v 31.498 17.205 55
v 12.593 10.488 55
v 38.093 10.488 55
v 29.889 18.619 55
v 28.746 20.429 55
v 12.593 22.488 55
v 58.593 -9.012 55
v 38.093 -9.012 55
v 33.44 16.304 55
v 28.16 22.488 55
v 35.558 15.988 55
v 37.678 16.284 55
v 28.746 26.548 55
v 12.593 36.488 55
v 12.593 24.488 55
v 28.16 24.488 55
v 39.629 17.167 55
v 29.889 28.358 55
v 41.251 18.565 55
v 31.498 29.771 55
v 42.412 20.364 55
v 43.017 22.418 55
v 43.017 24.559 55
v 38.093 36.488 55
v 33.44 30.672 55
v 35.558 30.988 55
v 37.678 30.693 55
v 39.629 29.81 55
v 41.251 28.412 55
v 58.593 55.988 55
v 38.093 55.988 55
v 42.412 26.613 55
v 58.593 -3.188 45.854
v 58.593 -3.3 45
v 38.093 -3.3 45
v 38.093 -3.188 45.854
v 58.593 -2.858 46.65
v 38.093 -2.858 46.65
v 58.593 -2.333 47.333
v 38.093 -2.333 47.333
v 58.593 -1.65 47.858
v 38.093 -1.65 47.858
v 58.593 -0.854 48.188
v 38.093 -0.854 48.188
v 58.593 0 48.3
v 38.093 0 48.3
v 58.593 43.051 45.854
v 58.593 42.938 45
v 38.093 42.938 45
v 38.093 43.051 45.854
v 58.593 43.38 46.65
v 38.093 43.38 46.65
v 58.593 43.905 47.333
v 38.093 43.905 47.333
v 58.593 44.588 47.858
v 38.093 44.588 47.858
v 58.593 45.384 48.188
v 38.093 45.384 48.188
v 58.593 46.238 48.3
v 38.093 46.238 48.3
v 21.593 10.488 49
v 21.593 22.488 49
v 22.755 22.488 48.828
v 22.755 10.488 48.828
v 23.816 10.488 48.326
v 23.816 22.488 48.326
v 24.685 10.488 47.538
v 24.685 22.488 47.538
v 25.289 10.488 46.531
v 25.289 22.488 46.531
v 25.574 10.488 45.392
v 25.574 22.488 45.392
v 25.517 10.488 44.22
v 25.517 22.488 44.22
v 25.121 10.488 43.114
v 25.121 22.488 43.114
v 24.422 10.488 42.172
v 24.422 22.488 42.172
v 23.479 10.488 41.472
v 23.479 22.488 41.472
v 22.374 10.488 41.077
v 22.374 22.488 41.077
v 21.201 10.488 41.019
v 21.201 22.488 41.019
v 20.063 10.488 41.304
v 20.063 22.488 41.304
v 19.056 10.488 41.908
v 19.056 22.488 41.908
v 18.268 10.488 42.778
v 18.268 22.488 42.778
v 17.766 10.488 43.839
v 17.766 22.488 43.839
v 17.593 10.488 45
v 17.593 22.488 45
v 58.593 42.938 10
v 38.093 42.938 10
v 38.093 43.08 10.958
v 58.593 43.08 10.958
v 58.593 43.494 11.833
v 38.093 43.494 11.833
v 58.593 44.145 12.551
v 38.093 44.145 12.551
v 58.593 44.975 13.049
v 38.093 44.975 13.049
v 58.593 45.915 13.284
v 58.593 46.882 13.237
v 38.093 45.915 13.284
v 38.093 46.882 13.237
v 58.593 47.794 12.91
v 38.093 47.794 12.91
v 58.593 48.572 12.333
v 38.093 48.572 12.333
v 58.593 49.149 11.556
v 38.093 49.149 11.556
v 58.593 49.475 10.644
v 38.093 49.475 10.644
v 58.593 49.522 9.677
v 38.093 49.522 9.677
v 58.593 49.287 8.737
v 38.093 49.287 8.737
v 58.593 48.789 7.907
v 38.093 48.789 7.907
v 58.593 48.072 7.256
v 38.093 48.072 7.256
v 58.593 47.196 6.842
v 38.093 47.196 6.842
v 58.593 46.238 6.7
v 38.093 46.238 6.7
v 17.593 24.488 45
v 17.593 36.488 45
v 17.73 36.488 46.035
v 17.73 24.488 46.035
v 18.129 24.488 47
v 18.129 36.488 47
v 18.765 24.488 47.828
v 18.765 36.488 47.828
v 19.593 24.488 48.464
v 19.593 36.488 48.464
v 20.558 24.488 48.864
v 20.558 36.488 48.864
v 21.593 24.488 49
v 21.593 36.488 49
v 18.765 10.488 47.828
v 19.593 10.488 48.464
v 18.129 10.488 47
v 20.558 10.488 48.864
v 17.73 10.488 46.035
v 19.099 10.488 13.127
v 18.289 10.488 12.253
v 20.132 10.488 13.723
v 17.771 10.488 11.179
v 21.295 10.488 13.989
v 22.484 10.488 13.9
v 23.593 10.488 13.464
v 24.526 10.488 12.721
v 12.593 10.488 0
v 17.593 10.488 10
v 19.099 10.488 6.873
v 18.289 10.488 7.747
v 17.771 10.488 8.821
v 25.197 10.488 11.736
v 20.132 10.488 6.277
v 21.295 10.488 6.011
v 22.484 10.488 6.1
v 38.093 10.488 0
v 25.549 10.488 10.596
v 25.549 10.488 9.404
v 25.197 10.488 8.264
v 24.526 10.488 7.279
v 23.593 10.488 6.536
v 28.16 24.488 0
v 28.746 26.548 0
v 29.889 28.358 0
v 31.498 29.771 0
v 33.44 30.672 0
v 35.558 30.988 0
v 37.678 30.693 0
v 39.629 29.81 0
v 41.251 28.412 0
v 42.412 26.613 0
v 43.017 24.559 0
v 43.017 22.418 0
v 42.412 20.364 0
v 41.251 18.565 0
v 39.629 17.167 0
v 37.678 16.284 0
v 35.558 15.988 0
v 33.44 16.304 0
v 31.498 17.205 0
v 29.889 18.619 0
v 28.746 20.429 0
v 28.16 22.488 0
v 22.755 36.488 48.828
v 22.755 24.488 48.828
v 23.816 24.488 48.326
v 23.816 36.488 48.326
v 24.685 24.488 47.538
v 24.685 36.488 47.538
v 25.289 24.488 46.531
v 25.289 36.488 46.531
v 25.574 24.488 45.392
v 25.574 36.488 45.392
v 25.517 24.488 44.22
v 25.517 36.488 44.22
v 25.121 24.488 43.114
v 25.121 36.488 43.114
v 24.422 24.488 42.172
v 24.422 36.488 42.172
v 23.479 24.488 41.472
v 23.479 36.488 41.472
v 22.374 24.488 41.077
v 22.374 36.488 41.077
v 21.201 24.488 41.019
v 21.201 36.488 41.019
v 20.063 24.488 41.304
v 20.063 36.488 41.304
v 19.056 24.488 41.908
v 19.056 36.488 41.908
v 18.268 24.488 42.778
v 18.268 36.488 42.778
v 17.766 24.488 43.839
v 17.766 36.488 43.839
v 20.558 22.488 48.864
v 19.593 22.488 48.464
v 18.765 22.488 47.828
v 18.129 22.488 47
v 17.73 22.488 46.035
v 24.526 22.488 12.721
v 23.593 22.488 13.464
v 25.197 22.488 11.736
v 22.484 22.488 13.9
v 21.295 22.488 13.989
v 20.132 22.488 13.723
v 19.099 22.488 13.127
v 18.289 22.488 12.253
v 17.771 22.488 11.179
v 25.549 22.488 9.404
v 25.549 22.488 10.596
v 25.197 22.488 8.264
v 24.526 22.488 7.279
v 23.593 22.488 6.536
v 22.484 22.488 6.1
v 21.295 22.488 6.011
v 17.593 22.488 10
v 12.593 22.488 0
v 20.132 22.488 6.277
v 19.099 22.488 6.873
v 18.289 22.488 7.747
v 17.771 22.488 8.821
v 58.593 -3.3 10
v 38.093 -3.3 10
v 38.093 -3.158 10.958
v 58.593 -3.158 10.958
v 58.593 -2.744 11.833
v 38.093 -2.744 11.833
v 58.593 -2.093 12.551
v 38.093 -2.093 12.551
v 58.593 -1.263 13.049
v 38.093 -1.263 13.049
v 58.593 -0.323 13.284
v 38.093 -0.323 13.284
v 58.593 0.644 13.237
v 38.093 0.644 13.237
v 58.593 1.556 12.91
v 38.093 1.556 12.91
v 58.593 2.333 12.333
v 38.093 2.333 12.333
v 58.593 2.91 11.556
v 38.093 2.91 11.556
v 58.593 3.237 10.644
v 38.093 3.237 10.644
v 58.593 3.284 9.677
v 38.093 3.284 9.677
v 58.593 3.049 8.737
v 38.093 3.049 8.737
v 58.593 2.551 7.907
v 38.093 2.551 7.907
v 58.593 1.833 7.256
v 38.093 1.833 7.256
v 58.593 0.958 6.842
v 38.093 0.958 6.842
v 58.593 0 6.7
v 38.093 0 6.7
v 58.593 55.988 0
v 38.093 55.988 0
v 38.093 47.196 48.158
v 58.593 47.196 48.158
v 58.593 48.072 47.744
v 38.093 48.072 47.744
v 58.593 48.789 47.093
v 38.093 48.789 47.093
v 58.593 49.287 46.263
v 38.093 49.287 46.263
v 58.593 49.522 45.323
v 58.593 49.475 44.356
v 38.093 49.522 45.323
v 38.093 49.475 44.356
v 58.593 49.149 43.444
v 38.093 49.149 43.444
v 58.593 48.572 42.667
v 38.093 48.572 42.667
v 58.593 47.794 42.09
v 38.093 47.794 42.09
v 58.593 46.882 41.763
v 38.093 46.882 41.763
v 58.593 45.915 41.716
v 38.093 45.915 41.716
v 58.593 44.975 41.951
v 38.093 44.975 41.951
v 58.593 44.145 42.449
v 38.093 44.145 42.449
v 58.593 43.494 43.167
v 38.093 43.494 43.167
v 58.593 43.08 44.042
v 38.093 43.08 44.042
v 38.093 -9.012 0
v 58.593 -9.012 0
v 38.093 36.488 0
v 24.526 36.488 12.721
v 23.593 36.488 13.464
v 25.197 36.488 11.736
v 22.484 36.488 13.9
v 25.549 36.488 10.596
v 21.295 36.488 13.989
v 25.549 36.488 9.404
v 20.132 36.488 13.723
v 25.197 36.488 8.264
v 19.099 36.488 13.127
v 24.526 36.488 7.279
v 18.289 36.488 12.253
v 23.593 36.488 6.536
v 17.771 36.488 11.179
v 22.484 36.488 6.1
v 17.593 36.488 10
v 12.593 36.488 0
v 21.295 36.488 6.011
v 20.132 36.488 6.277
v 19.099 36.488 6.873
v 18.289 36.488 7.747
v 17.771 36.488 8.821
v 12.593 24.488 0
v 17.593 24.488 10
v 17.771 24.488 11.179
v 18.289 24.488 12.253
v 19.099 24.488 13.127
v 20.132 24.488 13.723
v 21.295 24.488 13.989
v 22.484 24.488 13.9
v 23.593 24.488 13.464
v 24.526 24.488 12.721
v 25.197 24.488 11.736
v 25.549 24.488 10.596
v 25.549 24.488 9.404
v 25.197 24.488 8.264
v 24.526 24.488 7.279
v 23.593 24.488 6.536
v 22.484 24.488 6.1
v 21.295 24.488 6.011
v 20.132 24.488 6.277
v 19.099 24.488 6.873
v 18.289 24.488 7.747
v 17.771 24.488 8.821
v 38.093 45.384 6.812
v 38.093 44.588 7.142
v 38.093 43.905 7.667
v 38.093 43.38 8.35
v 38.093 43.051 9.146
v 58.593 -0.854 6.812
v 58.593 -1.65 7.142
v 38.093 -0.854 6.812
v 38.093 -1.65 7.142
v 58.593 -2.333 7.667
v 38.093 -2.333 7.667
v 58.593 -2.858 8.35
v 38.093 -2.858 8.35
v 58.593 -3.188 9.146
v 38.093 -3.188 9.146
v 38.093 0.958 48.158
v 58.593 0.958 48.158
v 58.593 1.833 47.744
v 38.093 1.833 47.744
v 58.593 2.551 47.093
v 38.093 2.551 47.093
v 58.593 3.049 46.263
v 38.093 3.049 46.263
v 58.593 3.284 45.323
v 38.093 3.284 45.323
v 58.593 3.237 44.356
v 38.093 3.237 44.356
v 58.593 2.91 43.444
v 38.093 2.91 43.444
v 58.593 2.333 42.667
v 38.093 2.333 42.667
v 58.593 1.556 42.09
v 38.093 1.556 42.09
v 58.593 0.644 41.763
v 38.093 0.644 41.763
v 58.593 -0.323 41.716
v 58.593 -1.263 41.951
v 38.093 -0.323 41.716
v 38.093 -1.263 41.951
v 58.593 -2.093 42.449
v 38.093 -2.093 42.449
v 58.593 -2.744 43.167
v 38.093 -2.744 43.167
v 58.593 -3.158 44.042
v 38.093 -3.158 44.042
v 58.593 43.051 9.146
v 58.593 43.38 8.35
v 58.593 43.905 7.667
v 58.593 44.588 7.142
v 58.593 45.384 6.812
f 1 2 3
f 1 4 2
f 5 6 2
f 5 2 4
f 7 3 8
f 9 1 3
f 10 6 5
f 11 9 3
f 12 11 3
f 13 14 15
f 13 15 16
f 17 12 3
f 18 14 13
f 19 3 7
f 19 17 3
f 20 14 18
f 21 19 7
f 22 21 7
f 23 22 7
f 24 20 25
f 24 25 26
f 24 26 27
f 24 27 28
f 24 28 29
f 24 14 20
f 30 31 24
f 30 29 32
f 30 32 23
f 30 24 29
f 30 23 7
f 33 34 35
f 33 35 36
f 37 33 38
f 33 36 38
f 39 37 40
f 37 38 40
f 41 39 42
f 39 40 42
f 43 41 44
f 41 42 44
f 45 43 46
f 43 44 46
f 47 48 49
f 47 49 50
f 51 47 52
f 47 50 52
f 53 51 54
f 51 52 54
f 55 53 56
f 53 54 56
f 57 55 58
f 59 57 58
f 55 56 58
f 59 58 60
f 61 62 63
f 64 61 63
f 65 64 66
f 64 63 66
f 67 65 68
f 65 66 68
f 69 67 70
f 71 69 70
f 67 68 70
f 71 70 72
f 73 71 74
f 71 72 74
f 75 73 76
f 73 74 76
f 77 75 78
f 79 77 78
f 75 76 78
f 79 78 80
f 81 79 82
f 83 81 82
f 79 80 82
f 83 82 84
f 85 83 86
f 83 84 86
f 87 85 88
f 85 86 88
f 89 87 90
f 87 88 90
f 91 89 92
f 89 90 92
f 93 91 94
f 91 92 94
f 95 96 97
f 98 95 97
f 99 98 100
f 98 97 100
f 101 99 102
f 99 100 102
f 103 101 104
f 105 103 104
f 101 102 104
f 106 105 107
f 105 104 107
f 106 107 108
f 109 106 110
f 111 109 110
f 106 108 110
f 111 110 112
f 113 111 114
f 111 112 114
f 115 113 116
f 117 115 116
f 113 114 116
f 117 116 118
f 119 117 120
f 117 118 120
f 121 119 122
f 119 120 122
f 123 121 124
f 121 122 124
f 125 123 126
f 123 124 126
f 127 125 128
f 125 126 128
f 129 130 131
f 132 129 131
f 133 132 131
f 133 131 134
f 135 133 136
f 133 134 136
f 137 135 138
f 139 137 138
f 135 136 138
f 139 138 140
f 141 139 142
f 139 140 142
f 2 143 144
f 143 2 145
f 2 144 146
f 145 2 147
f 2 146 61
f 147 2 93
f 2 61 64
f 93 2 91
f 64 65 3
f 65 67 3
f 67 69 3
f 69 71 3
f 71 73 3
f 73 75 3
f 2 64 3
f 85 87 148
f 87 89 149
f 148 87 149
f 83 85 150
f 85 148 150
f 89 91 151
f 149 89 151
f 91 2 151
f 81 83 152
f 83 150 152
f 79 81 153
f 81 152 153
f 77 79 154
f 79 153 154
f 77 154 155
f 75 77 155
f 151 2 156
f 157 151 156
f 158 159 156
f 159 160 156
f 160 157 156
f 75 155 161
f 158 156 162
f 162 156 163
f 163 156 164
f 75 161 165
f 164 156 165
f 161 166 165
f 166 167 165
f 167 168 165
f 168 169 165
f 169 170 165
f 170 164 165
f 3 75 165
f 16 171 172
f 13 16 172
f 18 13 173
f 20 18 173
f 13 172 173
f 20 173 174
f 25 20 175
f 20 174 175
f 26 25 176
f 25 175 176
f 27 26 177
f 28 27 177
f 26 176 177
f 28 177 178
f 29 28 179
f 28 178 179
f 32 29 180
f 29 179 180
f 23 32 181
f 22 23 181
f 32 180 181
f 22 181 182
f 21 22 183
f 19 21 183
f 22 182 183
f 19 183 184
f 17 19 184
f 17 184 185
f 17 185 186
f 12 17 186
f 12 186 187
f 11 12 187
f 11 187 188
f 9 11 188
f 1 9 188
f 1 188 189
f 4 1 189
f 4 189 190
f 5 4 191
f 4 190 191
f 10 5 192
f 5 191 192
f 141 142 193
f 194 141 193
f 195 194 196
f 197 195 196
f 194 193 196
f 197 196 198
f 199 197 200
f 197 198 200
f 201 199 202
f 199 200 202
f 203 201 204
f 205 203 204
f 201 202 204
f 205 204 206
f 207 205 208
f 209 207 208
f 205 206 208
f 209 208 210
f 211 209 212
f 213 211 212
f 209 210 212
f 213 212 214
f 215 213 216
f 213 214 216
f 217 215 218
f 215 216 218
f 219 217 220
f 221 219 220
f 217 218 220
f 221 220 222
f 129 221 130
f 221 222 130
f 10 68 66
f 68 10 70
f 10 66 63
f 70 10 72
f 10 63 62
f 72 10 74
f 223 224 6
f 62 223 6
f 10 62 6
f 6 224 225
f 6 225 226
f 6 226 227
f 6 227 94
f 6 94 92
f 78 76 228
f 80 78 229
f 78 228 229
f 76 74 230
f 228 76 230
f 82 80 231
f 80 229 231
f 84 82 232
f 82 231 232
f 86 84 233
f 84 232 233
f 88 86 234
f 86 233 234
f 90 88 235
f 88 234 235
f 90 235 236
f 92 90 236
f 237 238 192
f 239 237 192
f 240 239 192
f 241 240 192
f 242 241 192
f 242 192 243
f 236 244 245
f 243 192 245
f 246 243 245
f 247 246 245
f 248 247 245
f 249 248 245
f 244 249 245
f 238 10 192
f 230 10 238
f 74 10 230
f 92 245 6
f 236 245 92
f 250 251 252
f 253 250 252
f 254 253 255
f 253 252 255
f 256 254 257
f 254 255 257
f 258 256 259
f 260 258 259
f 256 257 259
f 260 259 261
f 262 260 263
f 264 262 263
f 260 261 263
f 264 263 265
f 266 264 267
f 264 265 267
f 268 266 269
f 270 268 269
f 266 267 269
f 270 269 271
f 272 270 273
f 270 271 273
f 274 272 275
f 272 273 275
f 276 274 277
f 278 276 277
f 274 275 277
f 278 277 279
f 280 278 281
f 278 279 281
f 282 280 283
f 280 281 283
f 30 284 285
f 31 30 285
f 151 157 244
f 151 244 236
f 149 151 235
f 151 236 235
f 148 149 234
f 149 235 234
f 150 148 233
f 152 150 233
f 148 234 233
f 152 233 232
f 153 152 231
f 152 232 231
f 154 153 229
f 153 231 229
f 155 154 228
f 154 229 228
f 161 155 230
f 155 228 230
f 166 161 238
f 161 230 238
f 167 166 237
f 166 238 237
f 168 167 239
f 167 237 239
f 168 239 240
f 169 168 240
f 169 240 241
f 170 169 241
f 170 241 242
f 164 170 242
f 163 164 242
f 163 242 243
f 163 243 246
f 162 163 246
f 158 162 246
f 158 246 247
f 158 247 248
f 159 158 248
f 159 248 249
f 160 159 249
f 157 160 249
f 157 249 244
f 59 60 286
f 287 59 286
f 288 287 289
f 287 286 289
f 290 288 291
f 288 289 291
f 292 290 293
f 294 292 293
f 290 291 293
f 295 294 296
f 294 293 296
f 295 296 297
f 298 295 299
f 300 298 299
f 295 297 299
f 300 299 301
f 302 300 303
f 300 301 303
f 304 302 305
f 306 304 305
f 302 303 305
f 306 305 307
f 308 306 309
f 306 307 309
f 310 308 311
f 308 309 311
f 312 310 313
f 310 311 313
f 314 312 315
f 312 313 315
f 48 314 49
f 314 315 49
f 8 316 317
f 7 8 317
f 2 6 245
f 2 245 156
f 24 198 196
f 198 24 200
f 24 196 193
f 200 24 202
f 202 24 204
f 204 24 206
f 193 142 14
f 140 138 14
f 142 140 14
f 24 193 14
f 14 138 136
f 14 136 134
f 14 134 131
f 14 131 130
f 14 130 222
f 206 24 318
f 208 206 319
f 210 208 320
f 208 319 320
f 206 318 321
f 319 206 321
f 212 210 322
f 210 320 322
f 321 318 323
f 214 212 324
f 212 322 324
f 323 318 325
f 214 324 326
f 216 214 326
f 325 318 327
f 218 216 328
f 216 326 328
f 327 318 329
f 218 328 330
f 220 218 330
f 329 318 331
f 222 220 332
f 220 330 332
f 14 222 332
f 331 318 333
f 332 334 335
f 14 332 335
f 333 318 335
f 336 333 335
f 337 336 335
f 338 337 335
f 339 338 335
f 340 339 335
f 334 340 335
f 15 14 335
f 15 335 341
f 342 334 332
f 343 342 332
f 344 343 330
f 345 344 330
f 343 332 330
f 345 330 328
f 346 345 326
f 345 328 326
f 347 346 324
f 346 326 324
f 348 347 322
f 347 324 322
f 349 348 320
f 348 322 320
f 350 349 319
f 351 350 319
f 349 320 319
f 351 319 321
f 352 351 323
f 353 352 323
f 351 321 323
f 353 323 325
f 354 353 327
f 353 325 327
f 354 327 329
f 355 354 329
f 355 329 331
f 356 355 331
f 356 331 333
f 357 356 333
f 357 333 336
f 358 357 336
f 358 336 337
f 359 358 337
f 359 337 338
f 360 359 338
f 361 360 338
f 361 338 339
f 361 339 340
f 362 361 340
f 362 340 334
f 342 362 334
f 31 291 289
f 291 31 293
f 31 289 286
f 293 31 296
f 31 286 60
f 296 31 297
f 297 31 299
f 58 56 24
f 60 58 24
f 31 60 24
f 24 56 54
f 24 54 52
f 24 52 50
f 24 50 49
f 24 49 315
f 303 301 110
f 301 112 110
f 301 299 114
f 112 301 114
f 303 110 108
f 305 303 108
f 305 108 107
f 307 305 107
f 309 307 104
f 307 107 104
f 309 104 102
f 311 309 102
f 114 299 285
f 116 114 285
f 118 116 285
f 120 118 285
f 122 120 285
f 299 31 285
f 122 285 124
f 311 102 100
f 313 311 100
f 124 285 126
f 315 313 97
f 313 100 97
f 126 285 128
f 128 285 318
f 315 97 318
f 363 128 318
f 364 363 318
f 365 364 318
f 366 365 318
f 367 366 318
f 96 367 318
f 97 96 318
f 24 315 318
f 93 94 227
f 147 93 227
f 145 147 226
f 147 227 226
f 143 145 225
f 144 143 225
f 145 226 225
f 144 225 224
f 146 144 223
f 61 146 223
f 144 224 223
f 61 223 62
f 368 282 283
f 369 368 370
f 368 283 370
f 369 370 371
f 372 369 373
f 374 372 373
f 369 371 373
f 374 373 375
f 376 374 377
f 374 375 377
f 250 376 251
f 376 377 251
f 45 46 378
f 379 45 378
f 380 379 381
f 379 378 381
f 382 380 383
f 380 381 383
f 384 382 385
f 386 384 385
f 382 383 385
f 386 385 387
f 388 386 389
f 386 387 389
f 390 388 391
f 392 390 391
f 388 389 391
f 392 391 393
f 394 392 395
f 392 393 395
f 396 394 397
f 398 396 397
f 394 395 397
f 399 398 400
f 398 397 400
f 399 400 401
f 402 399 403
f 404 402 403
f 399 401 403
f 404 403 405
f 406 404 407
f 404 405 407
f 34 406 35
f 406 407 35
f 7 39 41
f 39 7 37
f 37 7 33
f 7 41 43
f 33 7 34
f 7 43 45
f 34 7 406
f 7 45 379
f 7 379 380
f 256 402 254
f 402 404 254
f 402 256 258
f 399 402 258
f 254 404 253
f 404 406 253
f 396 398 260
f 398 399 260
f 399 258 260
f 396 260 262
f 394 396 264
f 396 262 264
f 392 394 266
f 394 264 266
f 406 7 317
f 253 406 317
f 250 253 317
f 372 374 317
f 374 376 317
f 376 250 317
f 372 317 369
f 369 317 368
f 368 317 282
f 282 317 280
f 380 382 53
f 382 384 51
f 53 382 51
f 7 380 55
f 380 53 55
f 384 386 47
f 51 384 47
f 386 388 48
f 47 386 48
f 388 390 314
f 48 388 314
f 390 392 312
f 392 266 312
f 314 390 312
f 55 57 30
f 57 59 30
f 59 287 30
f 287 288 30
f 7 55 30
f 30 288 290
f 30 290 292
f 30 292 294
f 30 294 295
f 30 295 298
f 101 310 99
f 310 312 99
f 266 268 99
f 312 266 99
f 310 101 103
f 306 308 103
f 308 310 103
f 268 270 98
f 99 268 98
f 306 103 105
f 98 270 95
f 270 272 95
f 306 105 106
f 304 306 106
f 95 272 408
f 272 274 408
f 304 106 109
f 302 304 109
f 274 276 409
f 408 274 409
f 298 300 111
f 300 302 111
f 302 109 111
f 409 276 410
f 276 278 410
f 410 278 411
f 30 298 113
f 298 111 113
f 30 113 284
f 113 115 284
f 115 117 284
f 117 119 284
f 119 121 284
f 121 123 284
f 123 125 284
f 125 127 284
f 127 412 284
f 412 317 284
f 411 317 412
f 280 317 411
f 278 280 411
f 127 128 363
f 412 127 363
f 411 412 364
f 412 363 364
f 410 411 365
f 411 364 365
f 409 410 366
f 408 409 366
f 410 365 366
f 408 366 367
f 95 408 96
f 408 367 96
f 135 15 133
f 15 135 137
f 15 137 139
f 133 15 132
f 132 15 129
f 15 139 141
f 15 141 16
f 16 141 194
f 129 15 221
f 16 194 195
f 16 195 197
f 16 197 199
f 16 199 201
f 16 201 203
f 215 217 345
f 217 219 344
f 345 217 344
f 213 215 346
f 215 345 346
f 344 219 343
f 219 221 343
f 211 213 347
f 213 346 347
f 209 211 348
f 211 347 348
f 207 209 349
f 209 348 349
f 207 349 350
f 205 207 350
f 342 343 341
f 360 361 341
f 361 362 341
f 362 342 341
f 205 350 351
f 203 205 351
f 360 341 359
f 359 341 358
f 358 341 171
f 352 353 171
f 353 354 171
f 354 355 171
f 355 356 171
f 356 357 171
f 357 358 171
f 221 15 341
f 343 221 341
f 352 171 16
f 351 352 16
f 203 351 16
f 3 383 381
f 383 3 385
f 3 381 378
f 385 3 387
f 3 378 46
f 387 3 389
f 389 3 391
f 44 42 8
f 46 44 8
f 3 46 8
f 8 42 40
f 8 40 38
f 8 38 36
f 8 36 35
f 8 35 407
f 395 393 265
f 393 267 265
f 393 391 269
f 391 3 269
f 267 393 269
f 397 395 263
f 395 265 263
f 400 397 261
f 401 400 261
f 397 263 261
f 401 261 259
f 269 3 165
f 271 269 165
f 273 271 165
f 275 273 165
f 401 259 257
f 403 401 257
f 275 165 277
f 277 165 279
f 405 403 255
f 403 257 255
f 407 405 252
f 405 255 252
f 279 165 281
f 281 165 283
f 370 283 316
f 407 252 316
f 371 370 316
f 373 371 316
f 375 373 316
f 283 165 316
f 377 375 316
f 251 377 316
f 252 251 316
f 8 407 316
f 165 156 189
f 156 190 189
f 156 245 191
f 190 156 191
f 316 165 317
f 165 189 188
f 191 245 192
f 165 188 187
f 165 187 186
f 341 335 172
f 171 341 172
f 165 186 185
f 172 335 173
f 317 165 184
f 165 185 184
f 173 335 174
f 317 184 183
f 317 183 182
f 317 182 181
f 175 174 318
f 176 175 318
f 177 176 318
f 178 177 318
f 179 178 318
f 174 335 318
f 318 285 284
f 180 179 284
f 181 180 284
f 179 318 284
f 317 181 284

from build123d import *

# Parameters (mm, degrees)
F1_DEPTH  = 55
F2_R      = 4
F3_DEPTH  = 29.3
F5_DEPTH  = 33.2
F7_DEPTH  = 34.5
F1_FACE_R = 3.3
F9_DEPTH  = 37.2


with BuildPart() as f1:
    # F0 (on Top) → F1 (new body)
    with BuildSketch(Plane.XY):
        with BuildLine():
            Line((58.593456, -9.011728), (58.593456, 55.988272))
            Line((58.593456, 55.988272), (38.093456, 55.988272))
            Line((38.093456, 55.988272), (38.093456, 36.488272))
            Line((38.093456, 36.488272), (12.593456, 36.488272))
            Line((12.593456, 36.488272), (12.593456, 24.488272))
            Line((12.593456, 24.488272), (28.160421, 24.488272))
            ThreePointArc((28.160421, 24.488272), (43.093456, 23.488272), (28.160421, 22.488272))
            Line((28.160421, 22.488272), (12.593456, 22.488272))
            Line((12.593456, 22.488272), (12.593456, 10.488272))
            Line((12.593456, 10.488272), (38.093456, 10.488272))
            Line((38.093456, 10.488272), (38.093456, -9.011728))
            Line((38.093456, -9.011728), (58.593456, -9.011728))
        make_face()
    extrude(amount=F1_DEPTH)

    # F2 (on face) → F3 (cut)
    with BuildSketch(Plane(origin=(0, 36.488272, 0), x_dir=(-1, 0, 0), z_dir=(0, 1, 0))):
        with Locations((-21.593456, 10)):
            Circle(F2_R)
        with BuildLine():
            ThreePointArc((-17.593456, 45), (-18.765028, 47.828427), (-21.593456, 49))
            ThreePointArc((-21.593456, 49), (-24.421883, 42.171573), (-17.593456, 45))
        make_face()
    extrude(amount=-F3_DEPTH, mode=Mode.SUBTRACT)

    # F4 (on face) → F5 (cut)
    with BuildSketch(Plane(origin=(38.093456, 0, 0), x_dir=(0, -1, 0), z_dir=(-1, 0, 0))):
        with BuildLine():
            ThreePointArc((3.3, 45), (2.333452, 47.333452), (0, 48.3))
            ThreePointArc((0, 48.3), (-2.333452, 42.666548), (3.3, 45))
        make_face()
        with BuildLine():
            ThreePointArc((3.3, 10), (-2.333452, 12.333452), (0, 6.7))
            ThreePointArc((0, 6.7), (2.333452, 7.666548), (3.3, 10))
        make_face()
    extrude(amount=-F5_DEPTH, mode=Mode.SUBTRACT)

    # F6 (on face) → F7 (cut)
    with BuildSketch(Plane(origin=(38.093456, 0, 0), x_dir=(0, -1, 0), z_dir=(-1, 0, 0))):
        with BuildLine():
            ThreePointArc((-42.938272, 45), (-43.90482, 47.333452), (-46.238272, 48.3))
            ThreePointArc((-46.238272, 48.3), (-48.571725, 42.666548), (-42.938272, 45))
        make_face()
    extrude(amount=-F7_DEPTH, mode=Mode.SUBTRACT)

    # F8 (on face) + F1_face (on face) → F9 (cut)
    with BuildSketch(Plane(origin=(38.093456, 0, 0), x_dir=(0, -1, 0), z_dir=(-1, 0, 0))):
        with BuildLine():
            ThreePointArc((-42.938272, 10), (-48.571725, 12.333452), (-46.238272, 6.7))
            ThreePointArc((-46.238272, 6.7), (-43.90482, 7.666548), (-42.938272, 10))
        make_face()
    with BuildSketch(Plane(origin=(25.343456, 36.488272, 27.5), x_dir=(-1, 0, 0), z_dir=(0, 1, 0))):
        Polygon((-33.25, 27.5), (-33.25, -27.5), (-33.25, -27.5), (-33.25, 27.5), align=None)
        with Locations((-33.25, 17.5)):
            Circle(F1_FACE_R, mode=Mode.SUBTRACT)
        with Locations((-33.25, 17.5)):
            Circle(F1_FACE_R, mode=Mode.SUBTRACT)
        with Locations((-33.25, -17.5)):
            Circle(F1_FACE_R, mode=Mode.SUBTRACT)
    extrude(amount=-F9_DEPTH, mode=Mode.SUBTRACT)


solid = f1.part
